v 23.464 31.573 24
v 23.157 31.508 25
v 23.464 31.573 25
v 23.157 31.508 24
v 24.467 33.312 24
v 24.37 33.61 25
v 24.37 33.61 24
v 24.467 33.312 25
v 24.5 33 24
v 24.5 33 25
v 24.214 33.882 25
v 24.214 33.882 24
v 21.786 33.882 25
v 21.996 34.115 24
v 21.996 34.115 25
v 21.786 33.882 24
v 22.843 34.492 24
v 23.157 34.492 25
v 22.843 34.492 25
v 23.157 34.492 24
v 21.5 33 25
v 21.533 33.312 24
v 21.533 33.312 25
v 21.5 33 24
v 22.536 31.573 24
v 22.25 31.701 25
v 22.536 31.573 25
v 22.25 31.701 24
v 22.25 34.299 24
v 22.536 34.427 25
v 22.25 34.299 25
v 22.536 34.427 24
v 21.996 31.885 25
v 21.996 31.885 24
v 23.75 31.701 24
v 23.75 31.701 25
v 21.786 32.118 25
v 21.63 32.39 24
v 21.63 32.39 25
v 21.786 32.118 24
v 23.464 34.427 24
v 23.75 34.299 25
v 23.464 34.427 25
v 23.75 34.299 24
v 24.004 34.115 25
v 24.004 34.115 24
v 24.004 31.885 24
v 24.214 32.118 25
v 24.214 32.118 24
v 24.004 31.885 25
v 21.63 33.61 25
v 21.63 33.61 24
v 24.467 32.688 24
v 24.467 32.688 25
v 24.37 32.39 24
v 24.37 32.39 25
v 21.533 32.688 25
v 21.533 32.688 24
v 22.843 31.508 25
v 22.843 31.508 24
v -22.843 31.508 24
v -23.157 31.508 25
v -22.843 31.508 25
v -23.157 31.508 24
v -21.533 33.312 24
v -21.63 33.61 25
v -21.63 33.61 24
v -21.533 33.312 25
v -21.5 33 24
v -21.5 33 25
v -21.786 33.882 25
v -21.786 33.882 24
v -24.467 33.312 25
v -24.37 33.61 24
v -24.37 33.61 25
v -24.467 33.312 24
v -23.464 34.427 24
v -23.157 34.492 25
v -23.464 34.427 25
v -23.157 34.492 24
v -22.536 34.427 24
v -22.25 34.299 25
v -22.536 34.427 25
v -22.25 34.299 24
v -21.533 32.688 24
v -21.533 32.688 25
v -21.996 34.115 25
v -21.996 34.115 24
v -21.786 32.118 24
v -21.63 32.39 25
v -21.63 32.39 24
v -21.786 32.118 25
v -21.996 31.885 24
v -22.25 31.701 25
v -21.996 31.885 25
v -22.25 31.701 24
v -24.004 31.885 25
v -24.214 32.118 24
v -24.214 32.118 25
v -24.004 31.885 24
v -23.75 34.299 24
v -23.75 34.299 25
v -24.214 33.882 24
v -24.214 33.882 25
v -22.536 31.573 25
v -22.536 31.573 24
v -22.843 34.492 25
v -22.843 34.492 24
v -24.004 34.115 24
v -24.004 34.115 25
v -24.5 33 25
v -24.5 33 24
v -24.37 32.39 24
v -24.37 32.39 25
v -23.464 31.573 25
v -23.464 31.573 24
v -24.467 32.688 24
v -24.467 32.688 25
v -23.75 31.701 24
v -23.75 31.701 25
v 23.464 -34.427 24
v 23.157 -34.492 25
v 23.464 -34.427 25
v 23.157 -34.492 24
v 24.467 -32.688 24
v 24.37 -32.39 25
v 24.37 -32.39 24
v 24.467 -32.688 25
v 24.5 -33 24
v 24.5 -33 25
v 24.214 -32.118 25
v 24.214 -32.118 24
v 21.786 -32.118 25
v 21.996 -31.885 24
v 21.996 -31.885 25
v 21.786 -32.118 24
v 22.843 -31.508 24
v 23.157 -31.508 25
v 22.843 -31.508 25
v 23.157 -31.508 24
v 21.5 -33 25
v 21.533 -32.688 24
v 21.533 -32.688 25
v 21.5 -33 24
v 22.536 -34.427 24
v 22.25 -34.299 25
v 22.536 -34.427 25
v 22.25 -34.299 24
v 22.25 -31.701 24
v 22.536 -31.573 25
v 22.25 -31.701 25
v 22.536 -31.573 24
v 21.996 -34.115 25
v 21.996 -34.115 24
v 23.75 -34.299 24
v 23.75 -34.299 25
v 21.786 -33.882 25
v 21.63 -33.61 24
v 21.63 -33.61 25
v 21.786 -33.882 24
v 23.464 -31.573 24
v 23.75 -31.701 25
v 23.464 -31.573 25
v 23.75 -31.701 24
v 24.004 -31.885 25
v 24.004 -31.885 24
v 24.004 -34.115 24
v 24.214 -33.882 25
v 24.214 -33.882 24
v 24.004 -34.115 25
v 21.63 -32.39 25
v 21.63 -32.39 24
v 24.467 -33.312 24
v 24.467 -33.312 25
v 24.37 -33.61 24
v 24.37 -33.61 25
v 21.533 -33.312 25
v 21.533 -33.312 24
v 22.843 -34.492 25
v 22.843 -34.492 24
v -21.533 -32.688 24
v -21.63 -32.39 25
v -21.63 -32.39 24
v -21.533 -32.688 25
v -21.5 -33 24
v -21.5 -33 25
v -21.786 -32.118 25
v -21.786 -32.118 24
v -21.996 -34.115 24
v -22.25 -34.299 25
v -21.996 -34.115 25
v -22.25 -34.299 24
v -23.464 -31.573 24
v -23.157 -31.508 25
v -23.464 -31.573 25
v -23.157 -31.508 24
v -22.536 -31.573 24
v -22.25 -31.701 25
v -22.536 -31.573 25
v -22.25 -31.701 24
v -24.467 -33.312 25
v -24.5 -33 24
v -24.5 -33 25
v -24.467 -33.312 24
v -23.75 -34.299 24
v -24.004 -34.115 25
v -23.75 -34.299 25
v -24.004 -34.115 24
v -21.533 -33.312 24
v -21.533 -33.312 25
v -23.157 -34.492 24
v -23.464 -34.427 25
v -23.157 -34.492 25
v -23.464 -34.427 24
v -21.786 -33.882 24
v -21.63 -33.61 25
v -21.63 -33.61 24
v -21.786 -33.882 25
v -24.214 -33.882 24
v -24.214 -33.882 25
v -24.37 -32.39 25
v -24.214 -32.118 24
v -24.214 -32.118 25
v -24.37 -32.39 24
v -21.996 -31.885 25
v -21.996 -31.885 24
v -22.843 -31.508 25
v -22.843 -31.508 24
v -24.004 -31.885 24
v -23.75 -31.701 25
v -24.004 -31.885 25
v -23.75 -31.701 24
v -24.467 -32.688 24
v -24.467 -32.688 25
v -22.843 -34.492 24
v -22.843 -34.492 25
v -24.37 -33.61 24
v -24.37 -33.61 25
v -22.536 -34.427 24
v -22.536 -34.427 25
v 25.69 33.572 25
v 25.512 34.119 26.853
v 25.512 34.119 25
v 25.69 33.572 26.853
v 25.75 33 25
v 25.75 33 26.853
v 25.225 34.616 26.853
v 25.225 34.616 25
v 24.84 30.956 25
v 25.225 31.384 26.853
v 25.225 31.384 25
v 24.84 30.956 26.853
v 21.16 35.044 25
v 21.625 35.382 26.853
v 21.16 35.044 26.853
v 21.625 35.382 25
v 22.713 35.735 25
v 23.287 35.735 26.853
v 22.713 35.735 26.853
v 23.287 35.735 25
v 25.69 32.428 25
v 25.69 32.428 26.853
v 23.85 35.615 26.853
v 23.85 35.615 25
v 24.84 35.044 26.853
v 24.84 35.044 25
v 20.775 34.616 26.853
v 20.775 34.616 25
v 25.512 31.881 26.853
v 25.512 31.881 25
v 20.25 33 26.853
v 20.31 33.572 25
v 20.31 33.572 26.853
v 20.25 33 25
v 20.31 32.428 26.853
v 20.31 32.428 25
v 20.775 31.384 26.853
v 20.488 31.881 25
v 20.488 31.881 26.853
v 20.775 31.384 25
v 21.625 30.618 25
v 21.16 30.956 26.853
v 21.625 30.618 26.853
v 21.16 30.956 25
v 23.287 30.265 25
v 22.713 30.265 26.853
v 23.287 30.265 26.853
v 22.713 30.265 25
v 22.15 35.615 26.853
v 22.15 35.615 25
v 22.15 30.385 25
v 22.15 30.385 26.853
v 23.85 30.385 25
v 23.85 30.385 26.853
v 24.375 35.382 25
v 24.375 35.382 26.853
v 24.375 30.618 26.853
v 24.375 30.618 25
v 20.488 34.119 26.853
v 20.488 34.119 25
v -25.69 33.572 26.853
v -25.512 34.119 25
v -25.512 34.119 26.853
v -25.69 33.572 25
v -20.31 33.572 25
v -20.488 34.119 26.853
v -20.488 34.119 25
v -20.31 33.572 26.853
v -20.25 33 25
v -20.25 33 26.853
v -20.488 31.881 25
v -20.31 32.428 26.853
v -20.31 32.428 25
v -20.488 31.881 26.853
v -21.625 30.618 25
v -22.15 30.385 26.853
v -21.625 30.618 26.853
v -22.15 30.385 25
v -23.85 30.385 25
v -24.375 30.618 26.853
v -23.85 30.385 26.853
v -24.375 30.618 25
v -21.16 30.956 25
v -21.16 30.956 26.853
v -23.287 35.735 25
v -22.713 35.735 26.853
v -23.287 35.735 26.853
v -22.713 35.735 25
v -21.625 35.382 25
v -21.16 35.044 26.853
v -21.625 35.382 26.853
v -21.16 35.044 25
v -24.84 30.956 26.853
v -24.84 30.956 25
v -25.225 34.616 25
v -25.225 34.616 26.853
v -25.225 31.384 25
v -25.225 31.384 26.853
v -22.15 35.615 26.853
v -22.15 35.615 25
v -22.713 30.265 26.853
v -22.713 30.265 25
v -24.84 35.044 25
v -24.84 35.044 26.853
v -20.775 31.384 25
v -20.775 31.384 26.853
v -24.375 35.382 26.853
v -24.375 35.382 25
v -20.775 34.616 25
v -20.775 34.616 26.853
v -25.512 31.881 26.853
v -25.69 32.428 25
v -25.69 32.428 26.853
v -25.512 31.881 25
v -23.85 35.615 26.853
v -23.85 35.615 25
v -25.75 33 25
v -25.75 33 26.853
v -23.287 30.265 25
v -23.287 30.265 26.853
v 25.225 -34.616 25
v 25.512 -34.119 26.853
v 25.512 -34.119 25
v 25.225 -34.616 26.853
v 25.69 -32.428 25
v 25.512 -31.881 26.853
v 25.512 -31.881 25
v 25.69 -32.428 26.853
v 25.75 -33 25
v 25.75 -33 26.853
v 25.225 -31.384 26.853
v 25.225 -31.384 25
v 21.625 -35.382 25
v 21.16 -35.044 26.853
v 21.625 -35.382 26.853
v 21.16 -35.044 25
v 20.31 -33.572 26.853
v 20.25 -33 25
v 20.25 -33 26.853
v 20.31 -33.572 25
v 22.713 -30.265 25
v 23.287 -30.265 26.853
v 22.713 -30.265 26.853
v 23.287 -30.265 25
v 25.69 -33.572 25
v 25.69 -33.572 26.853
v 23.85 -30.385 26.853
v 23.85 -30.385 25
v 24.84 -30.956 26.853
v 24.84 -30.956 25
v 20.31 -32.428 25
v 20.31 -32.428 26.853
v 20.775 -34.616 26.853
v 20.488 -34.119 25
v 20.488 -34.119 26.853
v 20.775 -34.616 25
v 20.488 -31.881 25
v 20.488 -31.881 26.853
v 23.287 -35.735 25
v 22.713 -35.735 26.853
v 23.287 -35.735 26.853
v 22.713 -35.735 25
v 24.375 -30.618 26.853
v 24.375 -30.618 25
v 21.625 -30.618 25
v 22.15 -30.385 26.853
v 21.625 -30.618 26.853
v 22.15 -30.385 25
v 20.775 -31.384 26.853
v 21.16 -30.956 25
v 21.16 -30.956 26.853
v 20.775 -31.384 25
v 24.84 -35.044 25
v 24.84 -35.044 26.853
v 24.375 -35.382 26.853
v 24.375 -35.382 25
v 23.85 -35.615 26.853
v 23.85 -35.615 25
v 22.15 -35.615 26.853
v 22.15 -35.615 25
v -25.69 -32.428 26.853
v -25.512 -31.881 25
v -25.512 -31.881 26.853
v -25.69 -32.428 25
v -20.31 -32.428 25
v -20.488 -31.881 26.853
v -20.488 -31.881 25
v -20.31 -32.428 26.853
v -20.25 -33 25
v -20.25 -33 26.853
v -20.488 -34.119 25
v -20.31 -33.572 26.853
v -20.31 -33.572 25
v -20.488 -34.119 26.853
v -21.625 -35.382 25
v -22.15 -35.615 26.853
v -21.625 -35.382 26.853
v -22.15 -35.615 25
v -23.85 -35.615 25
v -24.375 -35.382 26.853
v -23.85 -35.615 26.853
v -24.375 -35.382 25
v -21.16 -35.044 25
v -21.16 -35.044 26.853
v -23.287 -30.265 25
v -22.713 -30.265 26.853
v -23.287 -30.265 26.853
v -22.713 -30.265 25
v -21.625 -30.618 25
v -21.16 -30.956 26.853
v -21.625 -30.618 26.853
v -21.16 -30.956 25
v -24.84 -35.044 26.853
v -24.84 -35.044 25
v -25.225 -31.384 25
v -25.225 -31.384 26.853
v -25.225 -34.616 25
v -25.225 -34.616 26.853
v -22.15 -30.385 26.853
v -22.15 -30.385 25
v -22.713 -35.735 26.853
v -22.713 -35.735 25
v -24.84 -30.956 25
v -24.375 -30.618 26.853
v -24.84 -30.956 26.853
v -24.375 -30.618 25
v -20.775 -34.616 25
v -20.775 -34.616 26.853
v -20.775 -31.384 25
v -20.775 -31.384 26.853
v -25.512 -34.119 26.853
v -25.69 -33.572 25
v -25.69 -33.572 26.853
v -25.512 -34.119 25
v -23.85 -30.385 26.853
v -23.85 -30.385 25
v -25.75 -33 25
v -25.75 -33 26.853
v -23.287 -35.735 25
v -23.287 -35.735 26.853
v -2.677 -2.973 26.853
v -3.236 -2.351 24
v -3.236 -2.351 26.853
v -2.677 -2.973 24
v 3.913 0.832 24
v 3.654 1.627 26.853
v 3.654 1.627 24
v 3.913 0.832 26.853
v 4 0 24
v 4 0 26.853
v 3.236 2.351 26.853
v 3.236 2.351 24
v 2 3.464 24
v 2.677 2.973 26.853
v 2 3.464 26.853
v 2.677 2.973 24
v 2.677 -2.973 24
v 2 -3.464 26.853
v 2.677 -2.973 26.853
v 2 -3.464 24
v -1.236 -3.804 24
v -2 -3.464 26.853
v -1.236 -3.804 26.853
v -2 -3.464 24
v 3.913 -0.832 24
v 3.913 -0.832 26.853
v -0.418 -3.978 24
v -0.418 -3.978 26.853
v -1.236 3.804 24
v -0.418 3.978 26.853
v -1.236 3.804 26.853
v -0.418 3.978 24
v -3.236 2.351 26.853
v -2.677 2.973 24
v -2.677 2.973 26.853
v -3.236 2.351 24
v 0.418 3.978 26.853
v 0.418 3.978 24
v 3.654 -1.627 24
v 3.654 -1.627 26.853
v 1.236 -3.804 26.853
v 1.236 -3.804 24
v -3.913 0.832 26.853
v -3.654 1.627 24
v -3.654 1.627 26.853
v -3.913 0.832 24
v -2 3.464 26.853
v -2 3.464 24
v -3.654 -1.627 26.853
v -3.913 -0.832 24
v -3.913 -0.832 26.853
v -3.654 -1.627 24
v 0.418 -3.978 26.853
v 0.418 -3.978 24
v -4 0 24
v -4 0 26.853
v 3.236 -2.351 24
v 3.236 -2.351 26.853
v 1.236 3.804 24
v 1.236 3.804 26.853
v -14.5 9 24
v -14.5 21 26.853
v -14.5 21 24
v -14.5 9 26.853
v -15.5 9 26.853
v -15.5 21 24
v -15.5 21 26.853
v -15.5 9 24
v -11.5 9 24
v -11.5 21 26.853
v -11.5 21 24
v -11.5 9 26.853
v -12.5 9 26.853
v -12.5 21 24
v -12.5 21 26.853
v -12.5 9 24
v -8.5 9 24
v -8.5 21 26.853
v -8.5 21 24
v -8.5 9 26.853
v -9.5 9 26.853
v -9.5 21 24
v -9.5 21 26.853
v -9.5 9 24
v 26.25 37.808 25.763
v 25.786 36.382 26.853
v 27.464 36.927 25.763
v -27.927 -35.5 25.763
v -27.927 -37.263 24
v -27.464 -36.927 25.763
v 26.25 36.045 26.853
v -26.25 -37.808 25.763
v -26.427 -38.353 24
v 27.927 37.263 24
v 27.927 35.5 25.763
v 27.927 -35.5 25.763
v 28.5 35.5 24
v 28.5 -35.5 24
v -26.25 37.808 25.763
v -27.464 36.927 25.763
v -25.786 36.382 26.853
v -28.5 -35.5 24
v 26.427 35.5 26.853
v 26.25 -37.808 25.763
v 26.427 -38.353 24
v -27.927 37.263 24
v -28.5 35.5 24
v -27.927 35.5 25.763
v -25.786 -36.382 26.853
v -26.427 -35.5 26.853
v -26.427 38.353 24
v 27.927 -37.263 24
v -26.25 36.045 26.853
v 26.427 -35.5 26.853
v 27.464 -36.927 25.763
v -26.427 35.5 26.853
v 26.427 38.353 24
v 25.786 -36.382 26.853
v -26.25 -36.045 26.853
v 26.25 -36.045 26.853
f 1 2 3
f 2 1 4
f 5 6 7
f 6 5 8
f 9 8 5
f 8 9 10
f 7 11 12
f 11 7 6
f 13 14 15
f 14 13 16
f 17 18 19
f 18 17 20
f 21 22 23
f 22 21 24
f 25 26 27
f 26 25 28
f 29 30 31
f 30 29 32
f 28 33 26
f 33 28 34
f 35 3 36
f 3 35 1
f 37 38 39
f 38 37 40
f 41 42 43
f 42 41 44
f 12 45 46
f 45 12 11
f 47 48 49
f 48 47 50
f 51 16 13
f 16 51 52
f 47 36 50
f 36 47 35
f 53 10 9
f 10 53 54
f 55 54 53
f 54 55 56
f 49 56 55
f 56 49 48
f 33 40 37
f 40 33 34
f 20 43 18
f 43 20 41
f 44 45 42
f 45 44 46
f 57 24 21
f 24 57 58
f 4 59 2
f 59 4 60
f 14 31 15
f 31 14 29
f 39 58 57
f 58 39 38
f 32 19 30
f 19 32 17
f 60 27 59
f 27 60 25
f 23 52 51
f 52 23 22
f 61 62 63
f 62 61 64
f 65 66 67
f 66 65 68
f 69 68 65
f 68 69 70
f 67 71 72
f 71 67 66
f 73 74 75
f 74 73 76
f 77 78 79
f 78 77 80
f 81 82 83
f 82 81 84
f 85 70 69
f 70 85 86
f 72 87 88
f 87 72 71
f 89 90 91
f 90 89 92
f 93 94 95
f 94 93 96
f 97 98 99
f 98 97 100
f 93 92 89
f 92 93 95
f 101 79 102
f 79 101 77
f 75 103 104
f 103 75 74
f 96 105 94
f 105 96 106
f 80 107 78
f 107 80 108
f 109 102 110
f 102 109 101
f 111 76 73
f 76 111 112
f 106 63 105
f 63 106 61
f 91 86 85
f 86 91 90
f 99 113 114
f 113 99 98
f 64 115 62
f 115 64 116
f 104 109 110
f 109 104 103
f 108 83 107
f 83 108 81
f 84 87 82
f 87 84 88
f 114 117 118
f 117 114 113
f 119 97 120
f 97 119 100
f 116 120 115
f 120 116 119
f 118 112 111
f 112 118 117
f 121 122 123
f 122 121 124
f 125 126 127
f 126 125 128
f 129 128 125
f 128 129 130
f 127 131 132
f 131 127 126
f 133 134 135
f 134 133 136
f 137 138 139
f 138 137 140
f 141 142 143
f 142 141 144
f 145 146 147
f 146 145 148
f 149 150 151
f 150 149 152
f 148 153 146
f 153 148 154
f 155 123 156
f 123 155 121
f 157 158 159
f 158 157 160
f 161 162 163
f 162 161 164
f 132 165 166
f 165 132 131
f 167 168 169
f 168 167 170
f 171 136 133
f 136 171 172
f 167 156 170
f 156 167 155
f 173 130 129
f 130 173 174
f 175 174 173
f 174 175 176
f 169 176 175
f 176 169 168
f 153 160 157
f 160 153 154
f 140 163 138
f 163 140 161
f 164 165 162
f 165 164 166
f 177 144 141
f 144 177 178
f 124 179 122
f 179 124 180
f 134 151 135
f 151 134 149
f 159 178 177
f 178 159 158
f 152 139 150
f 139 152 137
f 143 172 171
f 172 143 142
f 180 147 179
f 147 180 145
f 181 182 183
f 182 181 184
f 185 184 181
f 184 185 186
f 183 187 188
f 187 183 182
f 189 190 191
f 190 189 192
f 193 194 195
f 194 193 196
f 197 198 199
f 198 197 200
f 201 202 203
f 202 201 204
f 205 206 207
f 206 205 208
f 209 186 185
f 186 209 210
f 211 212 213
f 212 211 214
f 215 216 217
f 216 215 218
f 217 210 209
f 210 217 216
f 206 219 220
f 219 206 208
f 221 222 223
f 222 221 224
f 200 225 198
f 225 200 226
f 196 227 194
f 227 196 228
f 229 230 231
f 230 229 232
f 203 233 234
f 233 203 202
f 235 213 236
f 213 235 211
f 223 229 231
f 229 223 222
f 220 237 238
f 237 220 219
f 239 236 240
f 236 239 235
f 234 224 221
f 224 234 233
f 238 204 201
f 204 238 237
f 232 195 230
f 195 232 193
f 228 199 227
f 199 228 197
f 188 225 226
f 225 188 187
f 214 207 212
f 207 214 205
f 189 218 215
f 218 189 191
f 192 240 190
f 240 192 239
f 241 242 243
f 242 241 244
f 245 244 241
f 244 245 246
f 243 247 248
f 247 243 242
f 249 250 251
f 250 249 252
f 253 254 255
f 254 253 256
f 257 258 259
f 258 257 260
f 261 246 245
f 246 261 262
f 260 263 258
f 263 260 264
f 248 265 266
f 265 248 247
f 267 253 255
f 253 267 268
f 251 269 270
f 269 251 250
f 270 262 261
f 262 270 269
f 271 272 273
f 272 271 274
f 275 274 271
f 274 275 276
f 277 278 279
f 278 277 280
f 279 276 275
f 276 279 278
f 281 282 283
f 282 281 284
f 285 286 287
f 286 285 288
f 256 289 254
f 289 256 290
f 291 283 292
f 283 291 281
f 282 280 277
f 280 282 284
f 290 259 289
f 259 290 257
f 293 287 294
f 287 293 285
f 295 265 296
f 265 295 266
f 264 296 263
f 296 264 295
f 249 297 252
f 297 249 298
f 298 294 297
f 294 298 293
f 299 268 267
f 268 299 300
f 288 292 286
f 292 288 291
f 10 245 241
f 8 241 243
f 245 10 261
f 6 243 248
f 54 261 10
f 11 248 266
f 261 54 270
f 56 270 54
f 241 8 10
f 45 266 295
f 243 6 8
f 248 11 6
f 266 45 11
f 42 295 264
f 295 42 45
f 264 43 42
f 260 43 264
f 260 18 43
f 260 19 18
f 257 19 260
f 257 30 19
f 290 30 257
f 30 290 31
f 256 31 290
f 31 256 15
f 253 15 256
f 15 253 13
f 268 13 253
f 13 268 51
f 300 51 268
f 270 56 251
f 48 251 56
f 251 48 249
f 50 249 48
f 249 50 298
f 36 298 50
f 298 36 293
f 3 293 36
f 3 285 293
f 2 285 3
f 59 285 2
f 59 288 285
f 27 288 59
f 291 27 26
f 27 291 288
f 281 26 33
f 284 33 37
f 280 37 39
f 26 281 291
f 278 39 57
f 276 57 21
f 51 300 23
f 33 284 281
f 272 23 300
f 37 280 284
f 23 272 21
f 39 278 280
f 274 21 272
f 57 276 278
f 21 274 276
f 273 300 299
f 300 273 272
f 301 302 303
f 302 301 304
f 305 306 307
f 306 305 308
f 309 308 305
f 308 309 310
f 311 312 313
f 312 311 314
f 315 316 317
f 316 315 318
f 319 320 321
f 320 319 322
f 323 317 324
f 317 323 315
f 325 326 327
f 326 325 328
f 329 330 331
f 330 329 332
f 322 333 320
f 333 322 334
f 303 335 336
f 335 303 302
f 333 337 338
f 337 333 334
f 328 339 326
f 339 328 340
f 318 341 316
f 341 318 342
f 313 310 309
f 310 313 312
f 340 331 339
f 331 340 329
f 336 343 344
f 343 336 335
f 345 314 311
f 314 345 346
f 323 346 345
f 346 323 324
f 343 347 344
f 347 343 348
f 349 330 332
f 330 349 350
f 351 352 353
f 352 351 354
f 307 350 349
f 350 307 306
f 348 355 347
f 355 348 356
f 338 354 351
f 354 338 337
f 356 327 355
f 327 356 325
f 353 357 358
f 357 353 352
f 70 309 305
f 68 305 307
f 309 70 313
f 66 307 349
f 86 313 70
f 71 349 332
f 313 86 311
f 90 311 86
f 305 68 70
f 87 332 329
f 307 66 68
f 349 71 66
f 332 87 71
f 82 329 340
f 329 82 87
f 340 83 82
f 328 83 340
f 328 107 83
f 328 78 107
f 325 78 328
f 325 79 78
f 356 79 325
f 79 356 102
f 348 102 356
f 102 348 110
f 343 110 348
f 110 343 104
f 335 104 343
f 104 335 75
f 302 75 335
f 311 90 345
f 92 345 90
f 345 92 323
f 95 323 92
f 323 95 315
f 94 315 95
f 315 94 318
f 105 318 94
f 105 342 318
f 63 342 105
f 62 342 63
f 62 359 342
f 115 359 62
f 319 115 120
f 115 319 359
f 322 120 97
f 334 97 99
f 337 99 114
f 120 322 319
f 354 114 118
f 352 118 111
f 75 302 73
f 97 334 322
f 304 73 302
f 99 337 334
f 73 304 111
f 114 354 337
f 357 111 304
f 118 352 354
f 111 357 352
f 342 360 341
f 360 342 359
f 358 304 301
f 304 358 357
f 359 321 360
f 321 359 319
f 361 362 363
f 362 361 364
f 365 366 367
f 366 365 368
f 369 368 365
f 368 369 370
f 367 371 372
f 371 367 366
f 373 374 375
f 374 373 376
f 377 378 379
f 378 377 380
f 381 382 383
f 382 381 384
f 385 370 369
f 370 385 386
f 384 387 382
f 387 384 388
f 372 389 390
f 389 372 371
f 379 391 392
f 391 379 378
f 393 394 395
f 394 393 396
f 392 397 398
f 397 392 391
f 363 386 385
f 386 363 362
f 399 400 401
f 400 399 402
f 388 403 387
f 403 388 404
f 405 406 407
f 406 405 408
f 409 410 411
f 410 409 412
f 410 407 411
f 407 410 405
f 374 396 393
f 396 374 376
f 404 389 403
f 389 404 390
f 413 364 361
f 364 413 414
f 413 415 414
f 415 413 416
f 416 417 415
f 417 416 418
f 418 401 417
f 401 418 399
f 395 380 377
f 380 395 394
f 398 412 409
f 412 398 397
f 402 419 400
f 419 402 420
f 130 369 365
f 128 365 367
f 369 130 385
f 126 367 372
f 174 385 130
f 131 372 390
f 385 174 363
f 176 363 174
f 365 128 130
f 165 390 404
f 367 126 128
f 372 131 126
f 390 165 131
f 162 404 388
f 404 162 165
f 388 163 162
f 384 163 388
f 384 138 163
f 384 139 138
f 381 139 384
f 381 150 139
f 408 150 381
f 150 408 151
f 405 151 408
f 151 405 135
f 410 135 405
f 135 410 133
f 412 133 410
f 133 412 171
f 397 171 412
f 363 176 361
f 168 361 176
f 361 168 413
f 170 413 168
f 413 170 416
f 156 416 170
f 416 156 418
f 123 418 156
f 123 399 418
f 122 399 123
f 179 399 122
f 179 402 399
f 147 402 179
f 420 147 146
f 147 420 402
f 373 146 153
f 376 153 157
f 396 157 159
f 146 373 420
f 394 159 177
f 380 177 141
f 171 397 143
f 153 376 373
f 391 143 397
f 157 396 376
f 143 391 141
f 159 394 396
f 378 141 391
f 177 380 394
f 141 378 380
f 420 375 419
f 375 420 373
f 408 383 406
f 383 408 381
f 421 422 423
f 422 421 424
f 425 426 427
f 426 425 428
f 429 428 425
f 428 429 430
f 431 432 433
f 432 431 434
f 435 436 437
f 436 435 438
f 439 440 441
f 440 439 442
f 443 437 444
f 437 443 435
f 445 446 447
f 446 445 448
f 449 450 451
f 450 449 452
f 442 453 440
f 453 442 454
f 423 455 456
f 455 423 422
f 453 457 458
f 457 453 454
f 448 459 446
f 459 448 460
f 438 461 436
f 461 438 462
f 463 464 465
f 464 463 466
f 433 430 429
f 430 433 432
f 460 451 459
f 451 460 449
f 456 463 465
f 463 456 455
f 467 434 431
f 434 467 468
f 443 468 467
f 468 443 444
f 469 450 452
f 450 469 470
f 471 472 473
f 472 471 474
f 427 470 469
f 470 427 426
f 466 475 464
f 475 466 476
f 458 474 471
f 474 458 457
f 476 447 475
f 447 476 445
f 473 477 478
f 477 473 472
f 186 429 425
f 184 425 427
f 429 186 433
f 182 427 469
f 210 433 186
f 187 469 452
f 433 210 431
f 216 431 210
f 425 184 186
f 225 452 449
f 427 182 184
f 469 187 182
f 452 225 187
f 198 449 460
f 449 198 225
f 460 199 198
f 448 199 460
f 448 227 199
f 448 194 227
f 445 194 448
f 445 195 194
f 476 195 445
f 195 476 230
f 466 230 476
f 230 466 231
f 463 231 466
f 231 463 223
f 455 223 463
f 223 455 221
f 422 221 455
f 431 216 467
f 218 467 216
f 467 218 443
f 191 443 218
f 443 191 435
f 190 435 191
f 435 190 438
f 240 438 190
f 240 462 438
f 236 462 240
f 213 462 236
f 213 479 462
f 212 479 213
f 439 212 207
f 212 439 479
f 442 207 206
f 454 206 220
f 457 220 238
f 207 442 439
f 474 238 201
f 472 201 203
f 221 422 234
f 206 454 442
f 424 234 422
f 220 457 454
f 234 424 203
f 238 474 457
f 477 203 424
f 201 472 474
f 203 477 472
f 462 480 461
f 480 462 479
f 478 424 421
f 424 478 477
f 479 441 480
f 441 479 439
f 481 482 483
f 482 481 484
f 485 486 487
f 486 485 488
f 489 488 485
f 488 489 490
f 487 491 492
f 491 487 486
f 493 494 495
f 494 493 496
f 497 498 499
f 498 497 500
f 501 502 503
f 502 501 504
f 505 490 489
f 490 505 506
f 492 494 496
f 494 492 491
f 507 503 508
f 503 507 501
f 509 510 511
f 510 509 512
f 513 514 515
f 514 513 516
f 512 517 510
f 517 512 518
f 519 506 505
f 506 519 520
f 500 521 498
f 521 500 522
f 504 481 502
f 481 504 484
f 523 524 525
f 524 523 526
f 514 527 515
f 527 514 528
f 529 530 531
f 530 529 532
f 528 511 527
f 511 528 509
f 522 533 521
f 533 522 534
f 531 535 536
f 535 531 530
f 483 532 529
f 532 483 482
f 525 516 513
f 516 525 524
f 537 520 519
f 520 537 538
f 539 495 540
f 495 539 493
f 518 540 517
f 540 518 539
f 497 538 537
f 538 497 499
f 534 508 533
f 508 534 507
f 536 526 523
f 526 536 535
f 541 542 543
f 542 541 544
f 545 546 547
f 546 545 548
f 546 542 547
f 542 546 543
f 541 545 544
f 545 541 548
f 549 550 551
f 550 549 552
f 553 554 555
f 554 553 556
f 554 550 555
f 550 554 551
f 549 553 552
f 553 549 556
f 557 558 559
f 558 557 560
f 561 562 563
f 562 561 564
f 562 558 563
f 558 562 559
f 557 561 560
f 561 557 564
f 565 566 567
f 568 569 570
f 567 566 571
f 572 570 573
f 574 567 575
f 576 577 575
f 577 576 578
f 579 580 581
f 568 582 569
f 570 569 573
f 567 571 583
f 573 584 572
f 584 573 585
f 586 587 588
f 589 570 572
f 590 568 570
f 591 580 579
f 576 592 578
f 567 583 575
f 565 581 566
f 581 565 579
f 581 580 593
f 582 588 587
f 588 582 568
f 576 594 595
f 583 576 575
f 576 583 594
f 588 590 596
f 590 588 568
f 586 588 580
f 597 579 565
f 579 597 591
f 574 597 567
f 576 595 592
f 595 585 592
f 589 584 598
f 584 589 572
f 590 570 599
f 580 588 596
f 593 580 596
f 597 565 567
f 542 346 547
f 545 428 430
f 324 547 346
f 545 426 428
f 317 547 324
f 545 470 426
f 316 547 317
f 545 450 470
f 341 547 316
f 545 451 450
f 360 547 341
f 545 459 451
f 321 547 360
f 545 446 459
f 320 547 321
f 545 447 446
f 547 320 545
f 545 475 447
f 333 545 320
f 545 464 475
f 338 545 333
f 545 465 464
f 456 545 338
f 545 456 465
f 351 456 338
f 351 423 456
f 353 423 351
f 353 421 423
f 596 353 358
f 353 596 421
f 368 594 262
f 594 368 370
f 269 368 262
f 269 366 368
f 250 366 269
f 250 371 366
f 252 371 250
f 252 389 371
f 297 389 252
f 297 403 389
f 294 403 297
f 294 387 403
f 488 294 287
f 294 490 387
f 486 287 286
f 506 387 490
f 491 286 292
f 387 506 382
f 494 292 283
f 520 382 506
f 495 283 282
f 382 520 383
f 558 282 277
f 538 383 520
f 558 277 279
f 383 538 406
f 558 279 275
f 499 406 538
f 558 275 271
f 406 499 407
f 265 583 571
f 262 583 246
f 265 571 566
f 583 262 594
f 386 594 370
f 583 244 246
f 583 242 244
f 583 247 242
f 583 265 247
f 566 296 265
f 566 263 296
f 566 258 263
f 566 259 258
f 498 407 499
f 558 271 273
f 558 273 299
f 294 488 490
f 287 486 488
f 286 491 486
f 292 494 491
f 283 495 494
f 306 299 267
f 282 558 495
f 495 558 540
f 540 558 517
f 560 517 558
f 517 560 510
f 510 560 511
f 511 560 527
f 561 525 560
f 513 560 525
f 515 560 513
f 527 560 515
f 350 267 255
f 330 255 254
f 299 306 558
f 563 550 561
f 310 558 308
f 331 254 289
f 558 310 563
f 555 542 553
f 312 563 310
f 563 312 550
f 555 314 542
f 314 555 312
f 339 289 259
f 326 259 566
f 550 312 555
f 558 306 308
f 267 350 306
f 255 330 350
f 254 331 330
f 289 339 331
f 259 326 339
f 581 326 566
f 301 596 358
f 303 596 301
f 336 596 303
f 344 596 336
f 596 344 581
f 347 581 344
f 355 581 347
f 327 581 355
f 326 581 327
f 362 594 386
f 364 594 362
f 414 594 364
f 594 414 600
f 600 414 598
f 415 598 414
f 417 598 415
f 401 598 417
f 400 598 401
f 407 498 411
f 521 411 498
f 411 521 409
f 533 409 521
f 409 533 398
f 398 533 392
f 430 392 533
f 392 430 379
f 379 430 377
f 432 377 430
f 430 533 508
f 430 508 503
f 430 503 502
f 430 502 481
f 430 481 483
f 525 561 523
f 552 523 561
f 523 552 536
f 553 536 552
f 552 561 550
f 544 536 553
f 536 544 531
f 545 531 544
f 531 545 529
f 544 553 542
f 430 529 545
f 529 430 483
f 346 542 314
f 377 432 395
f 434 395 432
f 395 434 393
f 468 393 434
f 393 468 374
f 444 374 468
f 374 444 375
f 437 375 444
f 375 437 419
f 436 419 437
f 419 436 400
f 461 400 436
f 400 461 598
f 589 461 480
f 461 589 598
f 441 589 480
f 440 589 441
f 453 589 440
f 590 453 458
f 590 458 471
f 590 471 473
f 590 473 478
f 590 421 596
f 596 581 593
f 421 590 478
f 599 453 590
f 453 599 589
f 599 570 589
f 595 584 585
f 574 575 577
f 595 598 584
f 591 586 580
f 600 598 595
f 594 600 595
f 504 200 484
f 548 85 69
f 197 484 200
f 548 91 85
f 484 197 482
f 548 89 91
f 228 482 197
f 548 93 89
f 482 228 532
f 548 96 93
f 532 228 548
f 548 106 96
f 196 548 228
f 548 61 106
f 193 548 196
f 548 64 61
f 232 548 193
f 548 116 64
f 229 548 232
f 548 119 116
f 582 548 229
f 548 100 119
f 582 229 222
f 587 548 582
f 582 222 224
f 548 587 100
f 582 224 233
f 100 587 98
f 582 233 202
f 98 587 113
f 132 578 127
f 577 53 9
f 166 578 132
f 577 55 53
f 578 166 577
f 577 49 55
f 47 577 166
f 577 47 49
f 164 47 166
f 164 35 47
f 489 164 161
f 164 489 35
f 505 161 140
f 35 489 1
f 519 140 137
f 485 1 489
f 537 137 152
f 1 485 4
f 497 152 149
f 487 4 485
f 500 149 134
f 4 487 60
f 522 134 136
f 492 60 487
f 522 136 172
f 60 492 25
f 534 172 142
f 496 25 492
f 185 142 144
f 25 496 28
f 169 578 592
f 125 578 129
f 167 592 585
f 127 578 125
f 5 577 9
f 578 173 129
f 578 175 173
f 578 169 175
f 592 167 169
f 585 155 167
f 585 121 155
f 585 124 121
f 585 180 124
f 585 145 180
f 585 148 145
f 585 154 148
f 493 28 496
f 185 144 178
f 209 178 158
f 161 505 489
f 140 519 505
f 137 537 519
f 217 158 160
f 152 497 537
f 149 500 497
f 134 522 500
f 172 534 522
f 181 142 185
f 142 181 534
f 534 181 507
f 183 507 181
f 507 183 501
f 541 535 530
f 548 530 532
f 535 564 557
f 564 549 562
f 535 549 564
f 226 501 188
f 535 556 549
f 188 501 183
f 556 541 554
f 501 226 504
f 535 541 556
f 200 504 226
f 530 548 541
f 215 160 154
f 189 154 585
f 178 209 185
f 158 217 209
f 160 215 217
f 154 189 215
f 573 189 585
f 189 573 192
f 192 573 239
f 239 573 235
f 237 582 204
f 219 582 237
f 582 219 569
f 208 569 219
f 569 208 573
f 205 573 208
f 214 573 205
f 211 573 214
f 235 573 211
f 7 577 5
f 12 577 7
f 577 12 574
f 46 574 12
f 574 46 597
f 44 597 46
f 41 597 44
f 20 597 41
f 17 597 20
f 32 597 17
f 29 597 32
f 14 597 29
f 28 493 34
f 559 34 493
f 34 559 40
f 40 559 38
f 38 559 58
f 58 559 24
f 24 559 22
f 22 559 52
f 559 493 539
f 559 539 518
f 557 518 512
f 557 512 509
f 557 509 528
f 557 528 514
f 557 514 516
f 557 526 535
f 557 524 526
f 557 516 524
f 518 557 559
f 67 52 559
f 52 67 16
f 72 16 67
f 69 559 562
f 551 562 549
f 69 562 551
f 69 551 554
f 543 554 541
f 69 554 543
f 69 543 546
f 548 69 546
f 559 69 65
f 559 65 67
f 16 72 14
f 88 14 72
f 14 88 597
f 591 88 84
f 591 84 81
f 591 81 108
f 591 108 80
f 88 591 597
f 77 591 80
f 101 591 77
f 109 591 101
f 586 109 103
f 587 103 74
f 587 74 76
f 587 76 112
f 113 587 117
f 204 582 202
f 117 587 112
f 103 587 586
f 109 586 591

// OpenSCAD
// Durchgangsprüfer
Wand = 1;

B9Vx = 27;
B9Vy = 55;
B9Vz = 18;

BLochX = B9Vx+3;
BLochY = B9Vy+3;
BLochZ = B9Vz;

PlatineX = 40;
PlatineY = 60;
PlatineZ = 15;


InX = PlatineX + 10;
InY = PlatineY + 10;
InZ = 40;

OutX = InX + Wand;
OutY = InY + Wand;
OutZ = InZ;


module OuterFrame() {
    minkowski() {
        cube([OutX,OutY,OutZ],center=true);
        sphere(r=3);
    }
} 

module InnerFrame() {
    translate([0,0,2])
    cube([InX,InY,InZ+4],center=true);
}

module Batterie9V(){
    color("Green")
    translate([0,0,-B9Vz/2])
    cube([B9Vx,B9Vy,B9Vz],center=true);
}

module BatterieLoch(){
    translate([0,0,-BLochZ]) {
        cube([BLochX,BLochY,BLochZ+4],center=true);
        translate([0,0,-4.5])
        cube([BLochX+2,BLochY+2,1],center=true);
    }
}

module Fachboden() {
    translate([0,0,2])
    difference() {
        cube([OutX,OutY,Wand],center=true);
        cube([InX-7,InX-7,Wand+1],center=true);
        PlatinenLoch();
    }
}

module BananenLoch() {
    rotate([0,90,0])
    translate([-10,10,OutX/2])
    cylinder(d=6.8,h=10,center=true, $fn=50);
    rotate([0,90,0])
    translate([-10,-10,OutX/2])
    cylinder(d=6.8,h=10,center=true, $fn=50);
}

module ObenPlan(){
    translate([0,0,OutZ/2+5])
    cube([OutX+10,OutY+10,10],center=true);
}

module Sockel() {
    difference(){
        cube([5,5,InZ/2-3],center=true);
        translate([0,0,5])
        cylinder(d=3,h=10,center=true,$fn=30);
    }
}

module Bohrsockel() {
    translate([(InX/2-2),(InY/2-2),InZ/4])
    Sockel();
    translate([-(InX/2-2),(InY/2-2),InZ/4])
    Sockel();
    translate([(InX/2-2),-(InY/2-2),InZ/4])
    Sockel();
    translate([-(InX/2-2),-(InY/2-2),InZ/4])
    Sockel();
}

module PlatinenLoch() {
    translate([18,28,0])
    cylinder(d=2,h=50,center=true,$fn=30);
    translate([-18,28,0])
    cylinder(d=2,h=50,center=true,$fn=30);
    translate([18,-28,0])
    cylinder(d=2,h=50,center=true,$fn=30);
    translate([-18,-28,0])
    cylinder(d=2,h=50,center=true,$fn=30);
}

module Platine() {
    translate([0,0,PlatineZ/2+3])
    color("Green")
    difference(){
        cube([PlatineX,PlatineY,PlatineZ],center=true);  
        PlatinenLoch();
    }
}

module Schnapper() {
    
    translate([0,23.5,4.8])
    union() {
        difference() {
            union() {
                rotate([-45,0,0])
                translate([0,0,-0.5])
                cube([19,19,1],center=true);
                rotate([45,0,0])
                translate([0,-0.75,0])
                cube([19,19,1],center=true);
            }
                translate([0,0,10])
                cube([20,20,20],center=true);           
                translate([0,0,-16.5])
                cube([20,20,20],center=true);           
                translate([0,16,-9])
                cube([20,20,20],center=true);           
        }
        translate([0,7,-4.5])
        difference() {
            cylinder(d=19,h=5,center=true);
            cylinder(d=10,h=6,center=true);
            translate([0,10,0])
            cube([20,20,20],center=true);
            translate([0,9,-9])
            cube([20,20,20],center=true);
            translate([0,-7,2])
            cube([20,5,4],center=true);
            translate([0,0,-0.3])
            cube([20,5,2.2],center=true);
        }
        
        
    }
}

module BatterieDeckel() {
    translate([0,0,-OutZ/2-Wand-3.1])
    difference() {
        union(){
           cube([31.0,58.7,1],center=true);
           translate([0,0,1.5])
           cube([29.5,57.2,2.2],center=true);
        }
       translate([0,25,-4])
       cylinder(d=4,h=10,center=true,$fn=30);
       translate([0,25,0])
       cylinder(d=2,h=10,center=true,$fn=30);
    }
    translate([0,-28,-OutZ/2-Wand+0.45])
    cube([15,6,2],center=true);
    translate([0,-28,-OutZ/2-Wand+0.45])
    cube([29,3,2],center=true);
}

module DeckelLoch() {
    translate([(InX/2-2),(InY/2-2),InZ/2])
    cylinder(d=3,h=10,center=true,$fn=30);
    translate([-(InX/2-2),(InY/2-2),InZ/2])
    cylinder(d=3,h=10,center=true,$fn=30);
    translate([(InX/2-2),-(InY/2-2),InZ/2])
    cylinder(d=3,h=10,center=true,$fn=30);
    translate([-(InX/2-2),-(InY/2-2),InZ/2])
    cylinder(d=3,h=10,center=true,$fn=30);

    translate([(InX/2-2),(InY/2-2),InZ/2+6])
    cylinder(d=5.5,h=10,center=true,$fn=30);
    translate([-(InX/2-2),(InY/2-2),InZ/2+6])
    cylinder(d=5.5,h=10,center=true,$fn=30);
    translate([(InX/2-2),-(InY/2-2),InZ/2+6])
    cylinder(d=5.5,h=10,center=true,$fn=30);
    translate([-(InX/2-2),-(InY/2-2),InZ/2+6])
    cylinder(d=5.5,h=10,center=true,$fn=30);
    
    
    translate([0,0,InZ/2])
    cylinder(d=8,h=10,center=true,$fn=30);
    
    translate([-15,15,InZ/2])
    cube([1,12,10],center=true);
    
    translate([-12,15,InZ/2])
    cube([1,12,10],center=true);
    
    translate([-9,15,InZ/2])
    cube([1,12,10],center=true);
    
}

module Deckel() {
    translate([0,0,4])
    difference() {
        OuterFrame();
        translate([0,0,-3])
        cube([OutX+15,OutY+15,OutZ+6],center=true);
        DeckelLoch();
    }
        
}

module SchalterLoch() {
    rotate([90,0,0])
    translate([0,-8,-20])
    cube([20.5,14.5,50],center=true);
}

module BatterieSchraube() {
    
    translate([0,InY/2-7,-InZ/2+1])
    difference(){
        cube([8,12,3],center=true);
        translate([0,-2.75,0])
        cylinder(d=2,h=10,center=true,$fn=30);
    }
}

module Box() {

    difference() {
        OuterFrame();
        InnerFrame();
        BatterieLoch();
        BananenLoch();
        ObenPlan();
        SchalterLoch();
    }
    Fachboden();
    Bohrsockel();
    BatterieSchraube();
    //Batterie9V();
    //Platine();
}

//Box();
//BatterieDeckel();
Deckel();
//BatterieSchraube();
